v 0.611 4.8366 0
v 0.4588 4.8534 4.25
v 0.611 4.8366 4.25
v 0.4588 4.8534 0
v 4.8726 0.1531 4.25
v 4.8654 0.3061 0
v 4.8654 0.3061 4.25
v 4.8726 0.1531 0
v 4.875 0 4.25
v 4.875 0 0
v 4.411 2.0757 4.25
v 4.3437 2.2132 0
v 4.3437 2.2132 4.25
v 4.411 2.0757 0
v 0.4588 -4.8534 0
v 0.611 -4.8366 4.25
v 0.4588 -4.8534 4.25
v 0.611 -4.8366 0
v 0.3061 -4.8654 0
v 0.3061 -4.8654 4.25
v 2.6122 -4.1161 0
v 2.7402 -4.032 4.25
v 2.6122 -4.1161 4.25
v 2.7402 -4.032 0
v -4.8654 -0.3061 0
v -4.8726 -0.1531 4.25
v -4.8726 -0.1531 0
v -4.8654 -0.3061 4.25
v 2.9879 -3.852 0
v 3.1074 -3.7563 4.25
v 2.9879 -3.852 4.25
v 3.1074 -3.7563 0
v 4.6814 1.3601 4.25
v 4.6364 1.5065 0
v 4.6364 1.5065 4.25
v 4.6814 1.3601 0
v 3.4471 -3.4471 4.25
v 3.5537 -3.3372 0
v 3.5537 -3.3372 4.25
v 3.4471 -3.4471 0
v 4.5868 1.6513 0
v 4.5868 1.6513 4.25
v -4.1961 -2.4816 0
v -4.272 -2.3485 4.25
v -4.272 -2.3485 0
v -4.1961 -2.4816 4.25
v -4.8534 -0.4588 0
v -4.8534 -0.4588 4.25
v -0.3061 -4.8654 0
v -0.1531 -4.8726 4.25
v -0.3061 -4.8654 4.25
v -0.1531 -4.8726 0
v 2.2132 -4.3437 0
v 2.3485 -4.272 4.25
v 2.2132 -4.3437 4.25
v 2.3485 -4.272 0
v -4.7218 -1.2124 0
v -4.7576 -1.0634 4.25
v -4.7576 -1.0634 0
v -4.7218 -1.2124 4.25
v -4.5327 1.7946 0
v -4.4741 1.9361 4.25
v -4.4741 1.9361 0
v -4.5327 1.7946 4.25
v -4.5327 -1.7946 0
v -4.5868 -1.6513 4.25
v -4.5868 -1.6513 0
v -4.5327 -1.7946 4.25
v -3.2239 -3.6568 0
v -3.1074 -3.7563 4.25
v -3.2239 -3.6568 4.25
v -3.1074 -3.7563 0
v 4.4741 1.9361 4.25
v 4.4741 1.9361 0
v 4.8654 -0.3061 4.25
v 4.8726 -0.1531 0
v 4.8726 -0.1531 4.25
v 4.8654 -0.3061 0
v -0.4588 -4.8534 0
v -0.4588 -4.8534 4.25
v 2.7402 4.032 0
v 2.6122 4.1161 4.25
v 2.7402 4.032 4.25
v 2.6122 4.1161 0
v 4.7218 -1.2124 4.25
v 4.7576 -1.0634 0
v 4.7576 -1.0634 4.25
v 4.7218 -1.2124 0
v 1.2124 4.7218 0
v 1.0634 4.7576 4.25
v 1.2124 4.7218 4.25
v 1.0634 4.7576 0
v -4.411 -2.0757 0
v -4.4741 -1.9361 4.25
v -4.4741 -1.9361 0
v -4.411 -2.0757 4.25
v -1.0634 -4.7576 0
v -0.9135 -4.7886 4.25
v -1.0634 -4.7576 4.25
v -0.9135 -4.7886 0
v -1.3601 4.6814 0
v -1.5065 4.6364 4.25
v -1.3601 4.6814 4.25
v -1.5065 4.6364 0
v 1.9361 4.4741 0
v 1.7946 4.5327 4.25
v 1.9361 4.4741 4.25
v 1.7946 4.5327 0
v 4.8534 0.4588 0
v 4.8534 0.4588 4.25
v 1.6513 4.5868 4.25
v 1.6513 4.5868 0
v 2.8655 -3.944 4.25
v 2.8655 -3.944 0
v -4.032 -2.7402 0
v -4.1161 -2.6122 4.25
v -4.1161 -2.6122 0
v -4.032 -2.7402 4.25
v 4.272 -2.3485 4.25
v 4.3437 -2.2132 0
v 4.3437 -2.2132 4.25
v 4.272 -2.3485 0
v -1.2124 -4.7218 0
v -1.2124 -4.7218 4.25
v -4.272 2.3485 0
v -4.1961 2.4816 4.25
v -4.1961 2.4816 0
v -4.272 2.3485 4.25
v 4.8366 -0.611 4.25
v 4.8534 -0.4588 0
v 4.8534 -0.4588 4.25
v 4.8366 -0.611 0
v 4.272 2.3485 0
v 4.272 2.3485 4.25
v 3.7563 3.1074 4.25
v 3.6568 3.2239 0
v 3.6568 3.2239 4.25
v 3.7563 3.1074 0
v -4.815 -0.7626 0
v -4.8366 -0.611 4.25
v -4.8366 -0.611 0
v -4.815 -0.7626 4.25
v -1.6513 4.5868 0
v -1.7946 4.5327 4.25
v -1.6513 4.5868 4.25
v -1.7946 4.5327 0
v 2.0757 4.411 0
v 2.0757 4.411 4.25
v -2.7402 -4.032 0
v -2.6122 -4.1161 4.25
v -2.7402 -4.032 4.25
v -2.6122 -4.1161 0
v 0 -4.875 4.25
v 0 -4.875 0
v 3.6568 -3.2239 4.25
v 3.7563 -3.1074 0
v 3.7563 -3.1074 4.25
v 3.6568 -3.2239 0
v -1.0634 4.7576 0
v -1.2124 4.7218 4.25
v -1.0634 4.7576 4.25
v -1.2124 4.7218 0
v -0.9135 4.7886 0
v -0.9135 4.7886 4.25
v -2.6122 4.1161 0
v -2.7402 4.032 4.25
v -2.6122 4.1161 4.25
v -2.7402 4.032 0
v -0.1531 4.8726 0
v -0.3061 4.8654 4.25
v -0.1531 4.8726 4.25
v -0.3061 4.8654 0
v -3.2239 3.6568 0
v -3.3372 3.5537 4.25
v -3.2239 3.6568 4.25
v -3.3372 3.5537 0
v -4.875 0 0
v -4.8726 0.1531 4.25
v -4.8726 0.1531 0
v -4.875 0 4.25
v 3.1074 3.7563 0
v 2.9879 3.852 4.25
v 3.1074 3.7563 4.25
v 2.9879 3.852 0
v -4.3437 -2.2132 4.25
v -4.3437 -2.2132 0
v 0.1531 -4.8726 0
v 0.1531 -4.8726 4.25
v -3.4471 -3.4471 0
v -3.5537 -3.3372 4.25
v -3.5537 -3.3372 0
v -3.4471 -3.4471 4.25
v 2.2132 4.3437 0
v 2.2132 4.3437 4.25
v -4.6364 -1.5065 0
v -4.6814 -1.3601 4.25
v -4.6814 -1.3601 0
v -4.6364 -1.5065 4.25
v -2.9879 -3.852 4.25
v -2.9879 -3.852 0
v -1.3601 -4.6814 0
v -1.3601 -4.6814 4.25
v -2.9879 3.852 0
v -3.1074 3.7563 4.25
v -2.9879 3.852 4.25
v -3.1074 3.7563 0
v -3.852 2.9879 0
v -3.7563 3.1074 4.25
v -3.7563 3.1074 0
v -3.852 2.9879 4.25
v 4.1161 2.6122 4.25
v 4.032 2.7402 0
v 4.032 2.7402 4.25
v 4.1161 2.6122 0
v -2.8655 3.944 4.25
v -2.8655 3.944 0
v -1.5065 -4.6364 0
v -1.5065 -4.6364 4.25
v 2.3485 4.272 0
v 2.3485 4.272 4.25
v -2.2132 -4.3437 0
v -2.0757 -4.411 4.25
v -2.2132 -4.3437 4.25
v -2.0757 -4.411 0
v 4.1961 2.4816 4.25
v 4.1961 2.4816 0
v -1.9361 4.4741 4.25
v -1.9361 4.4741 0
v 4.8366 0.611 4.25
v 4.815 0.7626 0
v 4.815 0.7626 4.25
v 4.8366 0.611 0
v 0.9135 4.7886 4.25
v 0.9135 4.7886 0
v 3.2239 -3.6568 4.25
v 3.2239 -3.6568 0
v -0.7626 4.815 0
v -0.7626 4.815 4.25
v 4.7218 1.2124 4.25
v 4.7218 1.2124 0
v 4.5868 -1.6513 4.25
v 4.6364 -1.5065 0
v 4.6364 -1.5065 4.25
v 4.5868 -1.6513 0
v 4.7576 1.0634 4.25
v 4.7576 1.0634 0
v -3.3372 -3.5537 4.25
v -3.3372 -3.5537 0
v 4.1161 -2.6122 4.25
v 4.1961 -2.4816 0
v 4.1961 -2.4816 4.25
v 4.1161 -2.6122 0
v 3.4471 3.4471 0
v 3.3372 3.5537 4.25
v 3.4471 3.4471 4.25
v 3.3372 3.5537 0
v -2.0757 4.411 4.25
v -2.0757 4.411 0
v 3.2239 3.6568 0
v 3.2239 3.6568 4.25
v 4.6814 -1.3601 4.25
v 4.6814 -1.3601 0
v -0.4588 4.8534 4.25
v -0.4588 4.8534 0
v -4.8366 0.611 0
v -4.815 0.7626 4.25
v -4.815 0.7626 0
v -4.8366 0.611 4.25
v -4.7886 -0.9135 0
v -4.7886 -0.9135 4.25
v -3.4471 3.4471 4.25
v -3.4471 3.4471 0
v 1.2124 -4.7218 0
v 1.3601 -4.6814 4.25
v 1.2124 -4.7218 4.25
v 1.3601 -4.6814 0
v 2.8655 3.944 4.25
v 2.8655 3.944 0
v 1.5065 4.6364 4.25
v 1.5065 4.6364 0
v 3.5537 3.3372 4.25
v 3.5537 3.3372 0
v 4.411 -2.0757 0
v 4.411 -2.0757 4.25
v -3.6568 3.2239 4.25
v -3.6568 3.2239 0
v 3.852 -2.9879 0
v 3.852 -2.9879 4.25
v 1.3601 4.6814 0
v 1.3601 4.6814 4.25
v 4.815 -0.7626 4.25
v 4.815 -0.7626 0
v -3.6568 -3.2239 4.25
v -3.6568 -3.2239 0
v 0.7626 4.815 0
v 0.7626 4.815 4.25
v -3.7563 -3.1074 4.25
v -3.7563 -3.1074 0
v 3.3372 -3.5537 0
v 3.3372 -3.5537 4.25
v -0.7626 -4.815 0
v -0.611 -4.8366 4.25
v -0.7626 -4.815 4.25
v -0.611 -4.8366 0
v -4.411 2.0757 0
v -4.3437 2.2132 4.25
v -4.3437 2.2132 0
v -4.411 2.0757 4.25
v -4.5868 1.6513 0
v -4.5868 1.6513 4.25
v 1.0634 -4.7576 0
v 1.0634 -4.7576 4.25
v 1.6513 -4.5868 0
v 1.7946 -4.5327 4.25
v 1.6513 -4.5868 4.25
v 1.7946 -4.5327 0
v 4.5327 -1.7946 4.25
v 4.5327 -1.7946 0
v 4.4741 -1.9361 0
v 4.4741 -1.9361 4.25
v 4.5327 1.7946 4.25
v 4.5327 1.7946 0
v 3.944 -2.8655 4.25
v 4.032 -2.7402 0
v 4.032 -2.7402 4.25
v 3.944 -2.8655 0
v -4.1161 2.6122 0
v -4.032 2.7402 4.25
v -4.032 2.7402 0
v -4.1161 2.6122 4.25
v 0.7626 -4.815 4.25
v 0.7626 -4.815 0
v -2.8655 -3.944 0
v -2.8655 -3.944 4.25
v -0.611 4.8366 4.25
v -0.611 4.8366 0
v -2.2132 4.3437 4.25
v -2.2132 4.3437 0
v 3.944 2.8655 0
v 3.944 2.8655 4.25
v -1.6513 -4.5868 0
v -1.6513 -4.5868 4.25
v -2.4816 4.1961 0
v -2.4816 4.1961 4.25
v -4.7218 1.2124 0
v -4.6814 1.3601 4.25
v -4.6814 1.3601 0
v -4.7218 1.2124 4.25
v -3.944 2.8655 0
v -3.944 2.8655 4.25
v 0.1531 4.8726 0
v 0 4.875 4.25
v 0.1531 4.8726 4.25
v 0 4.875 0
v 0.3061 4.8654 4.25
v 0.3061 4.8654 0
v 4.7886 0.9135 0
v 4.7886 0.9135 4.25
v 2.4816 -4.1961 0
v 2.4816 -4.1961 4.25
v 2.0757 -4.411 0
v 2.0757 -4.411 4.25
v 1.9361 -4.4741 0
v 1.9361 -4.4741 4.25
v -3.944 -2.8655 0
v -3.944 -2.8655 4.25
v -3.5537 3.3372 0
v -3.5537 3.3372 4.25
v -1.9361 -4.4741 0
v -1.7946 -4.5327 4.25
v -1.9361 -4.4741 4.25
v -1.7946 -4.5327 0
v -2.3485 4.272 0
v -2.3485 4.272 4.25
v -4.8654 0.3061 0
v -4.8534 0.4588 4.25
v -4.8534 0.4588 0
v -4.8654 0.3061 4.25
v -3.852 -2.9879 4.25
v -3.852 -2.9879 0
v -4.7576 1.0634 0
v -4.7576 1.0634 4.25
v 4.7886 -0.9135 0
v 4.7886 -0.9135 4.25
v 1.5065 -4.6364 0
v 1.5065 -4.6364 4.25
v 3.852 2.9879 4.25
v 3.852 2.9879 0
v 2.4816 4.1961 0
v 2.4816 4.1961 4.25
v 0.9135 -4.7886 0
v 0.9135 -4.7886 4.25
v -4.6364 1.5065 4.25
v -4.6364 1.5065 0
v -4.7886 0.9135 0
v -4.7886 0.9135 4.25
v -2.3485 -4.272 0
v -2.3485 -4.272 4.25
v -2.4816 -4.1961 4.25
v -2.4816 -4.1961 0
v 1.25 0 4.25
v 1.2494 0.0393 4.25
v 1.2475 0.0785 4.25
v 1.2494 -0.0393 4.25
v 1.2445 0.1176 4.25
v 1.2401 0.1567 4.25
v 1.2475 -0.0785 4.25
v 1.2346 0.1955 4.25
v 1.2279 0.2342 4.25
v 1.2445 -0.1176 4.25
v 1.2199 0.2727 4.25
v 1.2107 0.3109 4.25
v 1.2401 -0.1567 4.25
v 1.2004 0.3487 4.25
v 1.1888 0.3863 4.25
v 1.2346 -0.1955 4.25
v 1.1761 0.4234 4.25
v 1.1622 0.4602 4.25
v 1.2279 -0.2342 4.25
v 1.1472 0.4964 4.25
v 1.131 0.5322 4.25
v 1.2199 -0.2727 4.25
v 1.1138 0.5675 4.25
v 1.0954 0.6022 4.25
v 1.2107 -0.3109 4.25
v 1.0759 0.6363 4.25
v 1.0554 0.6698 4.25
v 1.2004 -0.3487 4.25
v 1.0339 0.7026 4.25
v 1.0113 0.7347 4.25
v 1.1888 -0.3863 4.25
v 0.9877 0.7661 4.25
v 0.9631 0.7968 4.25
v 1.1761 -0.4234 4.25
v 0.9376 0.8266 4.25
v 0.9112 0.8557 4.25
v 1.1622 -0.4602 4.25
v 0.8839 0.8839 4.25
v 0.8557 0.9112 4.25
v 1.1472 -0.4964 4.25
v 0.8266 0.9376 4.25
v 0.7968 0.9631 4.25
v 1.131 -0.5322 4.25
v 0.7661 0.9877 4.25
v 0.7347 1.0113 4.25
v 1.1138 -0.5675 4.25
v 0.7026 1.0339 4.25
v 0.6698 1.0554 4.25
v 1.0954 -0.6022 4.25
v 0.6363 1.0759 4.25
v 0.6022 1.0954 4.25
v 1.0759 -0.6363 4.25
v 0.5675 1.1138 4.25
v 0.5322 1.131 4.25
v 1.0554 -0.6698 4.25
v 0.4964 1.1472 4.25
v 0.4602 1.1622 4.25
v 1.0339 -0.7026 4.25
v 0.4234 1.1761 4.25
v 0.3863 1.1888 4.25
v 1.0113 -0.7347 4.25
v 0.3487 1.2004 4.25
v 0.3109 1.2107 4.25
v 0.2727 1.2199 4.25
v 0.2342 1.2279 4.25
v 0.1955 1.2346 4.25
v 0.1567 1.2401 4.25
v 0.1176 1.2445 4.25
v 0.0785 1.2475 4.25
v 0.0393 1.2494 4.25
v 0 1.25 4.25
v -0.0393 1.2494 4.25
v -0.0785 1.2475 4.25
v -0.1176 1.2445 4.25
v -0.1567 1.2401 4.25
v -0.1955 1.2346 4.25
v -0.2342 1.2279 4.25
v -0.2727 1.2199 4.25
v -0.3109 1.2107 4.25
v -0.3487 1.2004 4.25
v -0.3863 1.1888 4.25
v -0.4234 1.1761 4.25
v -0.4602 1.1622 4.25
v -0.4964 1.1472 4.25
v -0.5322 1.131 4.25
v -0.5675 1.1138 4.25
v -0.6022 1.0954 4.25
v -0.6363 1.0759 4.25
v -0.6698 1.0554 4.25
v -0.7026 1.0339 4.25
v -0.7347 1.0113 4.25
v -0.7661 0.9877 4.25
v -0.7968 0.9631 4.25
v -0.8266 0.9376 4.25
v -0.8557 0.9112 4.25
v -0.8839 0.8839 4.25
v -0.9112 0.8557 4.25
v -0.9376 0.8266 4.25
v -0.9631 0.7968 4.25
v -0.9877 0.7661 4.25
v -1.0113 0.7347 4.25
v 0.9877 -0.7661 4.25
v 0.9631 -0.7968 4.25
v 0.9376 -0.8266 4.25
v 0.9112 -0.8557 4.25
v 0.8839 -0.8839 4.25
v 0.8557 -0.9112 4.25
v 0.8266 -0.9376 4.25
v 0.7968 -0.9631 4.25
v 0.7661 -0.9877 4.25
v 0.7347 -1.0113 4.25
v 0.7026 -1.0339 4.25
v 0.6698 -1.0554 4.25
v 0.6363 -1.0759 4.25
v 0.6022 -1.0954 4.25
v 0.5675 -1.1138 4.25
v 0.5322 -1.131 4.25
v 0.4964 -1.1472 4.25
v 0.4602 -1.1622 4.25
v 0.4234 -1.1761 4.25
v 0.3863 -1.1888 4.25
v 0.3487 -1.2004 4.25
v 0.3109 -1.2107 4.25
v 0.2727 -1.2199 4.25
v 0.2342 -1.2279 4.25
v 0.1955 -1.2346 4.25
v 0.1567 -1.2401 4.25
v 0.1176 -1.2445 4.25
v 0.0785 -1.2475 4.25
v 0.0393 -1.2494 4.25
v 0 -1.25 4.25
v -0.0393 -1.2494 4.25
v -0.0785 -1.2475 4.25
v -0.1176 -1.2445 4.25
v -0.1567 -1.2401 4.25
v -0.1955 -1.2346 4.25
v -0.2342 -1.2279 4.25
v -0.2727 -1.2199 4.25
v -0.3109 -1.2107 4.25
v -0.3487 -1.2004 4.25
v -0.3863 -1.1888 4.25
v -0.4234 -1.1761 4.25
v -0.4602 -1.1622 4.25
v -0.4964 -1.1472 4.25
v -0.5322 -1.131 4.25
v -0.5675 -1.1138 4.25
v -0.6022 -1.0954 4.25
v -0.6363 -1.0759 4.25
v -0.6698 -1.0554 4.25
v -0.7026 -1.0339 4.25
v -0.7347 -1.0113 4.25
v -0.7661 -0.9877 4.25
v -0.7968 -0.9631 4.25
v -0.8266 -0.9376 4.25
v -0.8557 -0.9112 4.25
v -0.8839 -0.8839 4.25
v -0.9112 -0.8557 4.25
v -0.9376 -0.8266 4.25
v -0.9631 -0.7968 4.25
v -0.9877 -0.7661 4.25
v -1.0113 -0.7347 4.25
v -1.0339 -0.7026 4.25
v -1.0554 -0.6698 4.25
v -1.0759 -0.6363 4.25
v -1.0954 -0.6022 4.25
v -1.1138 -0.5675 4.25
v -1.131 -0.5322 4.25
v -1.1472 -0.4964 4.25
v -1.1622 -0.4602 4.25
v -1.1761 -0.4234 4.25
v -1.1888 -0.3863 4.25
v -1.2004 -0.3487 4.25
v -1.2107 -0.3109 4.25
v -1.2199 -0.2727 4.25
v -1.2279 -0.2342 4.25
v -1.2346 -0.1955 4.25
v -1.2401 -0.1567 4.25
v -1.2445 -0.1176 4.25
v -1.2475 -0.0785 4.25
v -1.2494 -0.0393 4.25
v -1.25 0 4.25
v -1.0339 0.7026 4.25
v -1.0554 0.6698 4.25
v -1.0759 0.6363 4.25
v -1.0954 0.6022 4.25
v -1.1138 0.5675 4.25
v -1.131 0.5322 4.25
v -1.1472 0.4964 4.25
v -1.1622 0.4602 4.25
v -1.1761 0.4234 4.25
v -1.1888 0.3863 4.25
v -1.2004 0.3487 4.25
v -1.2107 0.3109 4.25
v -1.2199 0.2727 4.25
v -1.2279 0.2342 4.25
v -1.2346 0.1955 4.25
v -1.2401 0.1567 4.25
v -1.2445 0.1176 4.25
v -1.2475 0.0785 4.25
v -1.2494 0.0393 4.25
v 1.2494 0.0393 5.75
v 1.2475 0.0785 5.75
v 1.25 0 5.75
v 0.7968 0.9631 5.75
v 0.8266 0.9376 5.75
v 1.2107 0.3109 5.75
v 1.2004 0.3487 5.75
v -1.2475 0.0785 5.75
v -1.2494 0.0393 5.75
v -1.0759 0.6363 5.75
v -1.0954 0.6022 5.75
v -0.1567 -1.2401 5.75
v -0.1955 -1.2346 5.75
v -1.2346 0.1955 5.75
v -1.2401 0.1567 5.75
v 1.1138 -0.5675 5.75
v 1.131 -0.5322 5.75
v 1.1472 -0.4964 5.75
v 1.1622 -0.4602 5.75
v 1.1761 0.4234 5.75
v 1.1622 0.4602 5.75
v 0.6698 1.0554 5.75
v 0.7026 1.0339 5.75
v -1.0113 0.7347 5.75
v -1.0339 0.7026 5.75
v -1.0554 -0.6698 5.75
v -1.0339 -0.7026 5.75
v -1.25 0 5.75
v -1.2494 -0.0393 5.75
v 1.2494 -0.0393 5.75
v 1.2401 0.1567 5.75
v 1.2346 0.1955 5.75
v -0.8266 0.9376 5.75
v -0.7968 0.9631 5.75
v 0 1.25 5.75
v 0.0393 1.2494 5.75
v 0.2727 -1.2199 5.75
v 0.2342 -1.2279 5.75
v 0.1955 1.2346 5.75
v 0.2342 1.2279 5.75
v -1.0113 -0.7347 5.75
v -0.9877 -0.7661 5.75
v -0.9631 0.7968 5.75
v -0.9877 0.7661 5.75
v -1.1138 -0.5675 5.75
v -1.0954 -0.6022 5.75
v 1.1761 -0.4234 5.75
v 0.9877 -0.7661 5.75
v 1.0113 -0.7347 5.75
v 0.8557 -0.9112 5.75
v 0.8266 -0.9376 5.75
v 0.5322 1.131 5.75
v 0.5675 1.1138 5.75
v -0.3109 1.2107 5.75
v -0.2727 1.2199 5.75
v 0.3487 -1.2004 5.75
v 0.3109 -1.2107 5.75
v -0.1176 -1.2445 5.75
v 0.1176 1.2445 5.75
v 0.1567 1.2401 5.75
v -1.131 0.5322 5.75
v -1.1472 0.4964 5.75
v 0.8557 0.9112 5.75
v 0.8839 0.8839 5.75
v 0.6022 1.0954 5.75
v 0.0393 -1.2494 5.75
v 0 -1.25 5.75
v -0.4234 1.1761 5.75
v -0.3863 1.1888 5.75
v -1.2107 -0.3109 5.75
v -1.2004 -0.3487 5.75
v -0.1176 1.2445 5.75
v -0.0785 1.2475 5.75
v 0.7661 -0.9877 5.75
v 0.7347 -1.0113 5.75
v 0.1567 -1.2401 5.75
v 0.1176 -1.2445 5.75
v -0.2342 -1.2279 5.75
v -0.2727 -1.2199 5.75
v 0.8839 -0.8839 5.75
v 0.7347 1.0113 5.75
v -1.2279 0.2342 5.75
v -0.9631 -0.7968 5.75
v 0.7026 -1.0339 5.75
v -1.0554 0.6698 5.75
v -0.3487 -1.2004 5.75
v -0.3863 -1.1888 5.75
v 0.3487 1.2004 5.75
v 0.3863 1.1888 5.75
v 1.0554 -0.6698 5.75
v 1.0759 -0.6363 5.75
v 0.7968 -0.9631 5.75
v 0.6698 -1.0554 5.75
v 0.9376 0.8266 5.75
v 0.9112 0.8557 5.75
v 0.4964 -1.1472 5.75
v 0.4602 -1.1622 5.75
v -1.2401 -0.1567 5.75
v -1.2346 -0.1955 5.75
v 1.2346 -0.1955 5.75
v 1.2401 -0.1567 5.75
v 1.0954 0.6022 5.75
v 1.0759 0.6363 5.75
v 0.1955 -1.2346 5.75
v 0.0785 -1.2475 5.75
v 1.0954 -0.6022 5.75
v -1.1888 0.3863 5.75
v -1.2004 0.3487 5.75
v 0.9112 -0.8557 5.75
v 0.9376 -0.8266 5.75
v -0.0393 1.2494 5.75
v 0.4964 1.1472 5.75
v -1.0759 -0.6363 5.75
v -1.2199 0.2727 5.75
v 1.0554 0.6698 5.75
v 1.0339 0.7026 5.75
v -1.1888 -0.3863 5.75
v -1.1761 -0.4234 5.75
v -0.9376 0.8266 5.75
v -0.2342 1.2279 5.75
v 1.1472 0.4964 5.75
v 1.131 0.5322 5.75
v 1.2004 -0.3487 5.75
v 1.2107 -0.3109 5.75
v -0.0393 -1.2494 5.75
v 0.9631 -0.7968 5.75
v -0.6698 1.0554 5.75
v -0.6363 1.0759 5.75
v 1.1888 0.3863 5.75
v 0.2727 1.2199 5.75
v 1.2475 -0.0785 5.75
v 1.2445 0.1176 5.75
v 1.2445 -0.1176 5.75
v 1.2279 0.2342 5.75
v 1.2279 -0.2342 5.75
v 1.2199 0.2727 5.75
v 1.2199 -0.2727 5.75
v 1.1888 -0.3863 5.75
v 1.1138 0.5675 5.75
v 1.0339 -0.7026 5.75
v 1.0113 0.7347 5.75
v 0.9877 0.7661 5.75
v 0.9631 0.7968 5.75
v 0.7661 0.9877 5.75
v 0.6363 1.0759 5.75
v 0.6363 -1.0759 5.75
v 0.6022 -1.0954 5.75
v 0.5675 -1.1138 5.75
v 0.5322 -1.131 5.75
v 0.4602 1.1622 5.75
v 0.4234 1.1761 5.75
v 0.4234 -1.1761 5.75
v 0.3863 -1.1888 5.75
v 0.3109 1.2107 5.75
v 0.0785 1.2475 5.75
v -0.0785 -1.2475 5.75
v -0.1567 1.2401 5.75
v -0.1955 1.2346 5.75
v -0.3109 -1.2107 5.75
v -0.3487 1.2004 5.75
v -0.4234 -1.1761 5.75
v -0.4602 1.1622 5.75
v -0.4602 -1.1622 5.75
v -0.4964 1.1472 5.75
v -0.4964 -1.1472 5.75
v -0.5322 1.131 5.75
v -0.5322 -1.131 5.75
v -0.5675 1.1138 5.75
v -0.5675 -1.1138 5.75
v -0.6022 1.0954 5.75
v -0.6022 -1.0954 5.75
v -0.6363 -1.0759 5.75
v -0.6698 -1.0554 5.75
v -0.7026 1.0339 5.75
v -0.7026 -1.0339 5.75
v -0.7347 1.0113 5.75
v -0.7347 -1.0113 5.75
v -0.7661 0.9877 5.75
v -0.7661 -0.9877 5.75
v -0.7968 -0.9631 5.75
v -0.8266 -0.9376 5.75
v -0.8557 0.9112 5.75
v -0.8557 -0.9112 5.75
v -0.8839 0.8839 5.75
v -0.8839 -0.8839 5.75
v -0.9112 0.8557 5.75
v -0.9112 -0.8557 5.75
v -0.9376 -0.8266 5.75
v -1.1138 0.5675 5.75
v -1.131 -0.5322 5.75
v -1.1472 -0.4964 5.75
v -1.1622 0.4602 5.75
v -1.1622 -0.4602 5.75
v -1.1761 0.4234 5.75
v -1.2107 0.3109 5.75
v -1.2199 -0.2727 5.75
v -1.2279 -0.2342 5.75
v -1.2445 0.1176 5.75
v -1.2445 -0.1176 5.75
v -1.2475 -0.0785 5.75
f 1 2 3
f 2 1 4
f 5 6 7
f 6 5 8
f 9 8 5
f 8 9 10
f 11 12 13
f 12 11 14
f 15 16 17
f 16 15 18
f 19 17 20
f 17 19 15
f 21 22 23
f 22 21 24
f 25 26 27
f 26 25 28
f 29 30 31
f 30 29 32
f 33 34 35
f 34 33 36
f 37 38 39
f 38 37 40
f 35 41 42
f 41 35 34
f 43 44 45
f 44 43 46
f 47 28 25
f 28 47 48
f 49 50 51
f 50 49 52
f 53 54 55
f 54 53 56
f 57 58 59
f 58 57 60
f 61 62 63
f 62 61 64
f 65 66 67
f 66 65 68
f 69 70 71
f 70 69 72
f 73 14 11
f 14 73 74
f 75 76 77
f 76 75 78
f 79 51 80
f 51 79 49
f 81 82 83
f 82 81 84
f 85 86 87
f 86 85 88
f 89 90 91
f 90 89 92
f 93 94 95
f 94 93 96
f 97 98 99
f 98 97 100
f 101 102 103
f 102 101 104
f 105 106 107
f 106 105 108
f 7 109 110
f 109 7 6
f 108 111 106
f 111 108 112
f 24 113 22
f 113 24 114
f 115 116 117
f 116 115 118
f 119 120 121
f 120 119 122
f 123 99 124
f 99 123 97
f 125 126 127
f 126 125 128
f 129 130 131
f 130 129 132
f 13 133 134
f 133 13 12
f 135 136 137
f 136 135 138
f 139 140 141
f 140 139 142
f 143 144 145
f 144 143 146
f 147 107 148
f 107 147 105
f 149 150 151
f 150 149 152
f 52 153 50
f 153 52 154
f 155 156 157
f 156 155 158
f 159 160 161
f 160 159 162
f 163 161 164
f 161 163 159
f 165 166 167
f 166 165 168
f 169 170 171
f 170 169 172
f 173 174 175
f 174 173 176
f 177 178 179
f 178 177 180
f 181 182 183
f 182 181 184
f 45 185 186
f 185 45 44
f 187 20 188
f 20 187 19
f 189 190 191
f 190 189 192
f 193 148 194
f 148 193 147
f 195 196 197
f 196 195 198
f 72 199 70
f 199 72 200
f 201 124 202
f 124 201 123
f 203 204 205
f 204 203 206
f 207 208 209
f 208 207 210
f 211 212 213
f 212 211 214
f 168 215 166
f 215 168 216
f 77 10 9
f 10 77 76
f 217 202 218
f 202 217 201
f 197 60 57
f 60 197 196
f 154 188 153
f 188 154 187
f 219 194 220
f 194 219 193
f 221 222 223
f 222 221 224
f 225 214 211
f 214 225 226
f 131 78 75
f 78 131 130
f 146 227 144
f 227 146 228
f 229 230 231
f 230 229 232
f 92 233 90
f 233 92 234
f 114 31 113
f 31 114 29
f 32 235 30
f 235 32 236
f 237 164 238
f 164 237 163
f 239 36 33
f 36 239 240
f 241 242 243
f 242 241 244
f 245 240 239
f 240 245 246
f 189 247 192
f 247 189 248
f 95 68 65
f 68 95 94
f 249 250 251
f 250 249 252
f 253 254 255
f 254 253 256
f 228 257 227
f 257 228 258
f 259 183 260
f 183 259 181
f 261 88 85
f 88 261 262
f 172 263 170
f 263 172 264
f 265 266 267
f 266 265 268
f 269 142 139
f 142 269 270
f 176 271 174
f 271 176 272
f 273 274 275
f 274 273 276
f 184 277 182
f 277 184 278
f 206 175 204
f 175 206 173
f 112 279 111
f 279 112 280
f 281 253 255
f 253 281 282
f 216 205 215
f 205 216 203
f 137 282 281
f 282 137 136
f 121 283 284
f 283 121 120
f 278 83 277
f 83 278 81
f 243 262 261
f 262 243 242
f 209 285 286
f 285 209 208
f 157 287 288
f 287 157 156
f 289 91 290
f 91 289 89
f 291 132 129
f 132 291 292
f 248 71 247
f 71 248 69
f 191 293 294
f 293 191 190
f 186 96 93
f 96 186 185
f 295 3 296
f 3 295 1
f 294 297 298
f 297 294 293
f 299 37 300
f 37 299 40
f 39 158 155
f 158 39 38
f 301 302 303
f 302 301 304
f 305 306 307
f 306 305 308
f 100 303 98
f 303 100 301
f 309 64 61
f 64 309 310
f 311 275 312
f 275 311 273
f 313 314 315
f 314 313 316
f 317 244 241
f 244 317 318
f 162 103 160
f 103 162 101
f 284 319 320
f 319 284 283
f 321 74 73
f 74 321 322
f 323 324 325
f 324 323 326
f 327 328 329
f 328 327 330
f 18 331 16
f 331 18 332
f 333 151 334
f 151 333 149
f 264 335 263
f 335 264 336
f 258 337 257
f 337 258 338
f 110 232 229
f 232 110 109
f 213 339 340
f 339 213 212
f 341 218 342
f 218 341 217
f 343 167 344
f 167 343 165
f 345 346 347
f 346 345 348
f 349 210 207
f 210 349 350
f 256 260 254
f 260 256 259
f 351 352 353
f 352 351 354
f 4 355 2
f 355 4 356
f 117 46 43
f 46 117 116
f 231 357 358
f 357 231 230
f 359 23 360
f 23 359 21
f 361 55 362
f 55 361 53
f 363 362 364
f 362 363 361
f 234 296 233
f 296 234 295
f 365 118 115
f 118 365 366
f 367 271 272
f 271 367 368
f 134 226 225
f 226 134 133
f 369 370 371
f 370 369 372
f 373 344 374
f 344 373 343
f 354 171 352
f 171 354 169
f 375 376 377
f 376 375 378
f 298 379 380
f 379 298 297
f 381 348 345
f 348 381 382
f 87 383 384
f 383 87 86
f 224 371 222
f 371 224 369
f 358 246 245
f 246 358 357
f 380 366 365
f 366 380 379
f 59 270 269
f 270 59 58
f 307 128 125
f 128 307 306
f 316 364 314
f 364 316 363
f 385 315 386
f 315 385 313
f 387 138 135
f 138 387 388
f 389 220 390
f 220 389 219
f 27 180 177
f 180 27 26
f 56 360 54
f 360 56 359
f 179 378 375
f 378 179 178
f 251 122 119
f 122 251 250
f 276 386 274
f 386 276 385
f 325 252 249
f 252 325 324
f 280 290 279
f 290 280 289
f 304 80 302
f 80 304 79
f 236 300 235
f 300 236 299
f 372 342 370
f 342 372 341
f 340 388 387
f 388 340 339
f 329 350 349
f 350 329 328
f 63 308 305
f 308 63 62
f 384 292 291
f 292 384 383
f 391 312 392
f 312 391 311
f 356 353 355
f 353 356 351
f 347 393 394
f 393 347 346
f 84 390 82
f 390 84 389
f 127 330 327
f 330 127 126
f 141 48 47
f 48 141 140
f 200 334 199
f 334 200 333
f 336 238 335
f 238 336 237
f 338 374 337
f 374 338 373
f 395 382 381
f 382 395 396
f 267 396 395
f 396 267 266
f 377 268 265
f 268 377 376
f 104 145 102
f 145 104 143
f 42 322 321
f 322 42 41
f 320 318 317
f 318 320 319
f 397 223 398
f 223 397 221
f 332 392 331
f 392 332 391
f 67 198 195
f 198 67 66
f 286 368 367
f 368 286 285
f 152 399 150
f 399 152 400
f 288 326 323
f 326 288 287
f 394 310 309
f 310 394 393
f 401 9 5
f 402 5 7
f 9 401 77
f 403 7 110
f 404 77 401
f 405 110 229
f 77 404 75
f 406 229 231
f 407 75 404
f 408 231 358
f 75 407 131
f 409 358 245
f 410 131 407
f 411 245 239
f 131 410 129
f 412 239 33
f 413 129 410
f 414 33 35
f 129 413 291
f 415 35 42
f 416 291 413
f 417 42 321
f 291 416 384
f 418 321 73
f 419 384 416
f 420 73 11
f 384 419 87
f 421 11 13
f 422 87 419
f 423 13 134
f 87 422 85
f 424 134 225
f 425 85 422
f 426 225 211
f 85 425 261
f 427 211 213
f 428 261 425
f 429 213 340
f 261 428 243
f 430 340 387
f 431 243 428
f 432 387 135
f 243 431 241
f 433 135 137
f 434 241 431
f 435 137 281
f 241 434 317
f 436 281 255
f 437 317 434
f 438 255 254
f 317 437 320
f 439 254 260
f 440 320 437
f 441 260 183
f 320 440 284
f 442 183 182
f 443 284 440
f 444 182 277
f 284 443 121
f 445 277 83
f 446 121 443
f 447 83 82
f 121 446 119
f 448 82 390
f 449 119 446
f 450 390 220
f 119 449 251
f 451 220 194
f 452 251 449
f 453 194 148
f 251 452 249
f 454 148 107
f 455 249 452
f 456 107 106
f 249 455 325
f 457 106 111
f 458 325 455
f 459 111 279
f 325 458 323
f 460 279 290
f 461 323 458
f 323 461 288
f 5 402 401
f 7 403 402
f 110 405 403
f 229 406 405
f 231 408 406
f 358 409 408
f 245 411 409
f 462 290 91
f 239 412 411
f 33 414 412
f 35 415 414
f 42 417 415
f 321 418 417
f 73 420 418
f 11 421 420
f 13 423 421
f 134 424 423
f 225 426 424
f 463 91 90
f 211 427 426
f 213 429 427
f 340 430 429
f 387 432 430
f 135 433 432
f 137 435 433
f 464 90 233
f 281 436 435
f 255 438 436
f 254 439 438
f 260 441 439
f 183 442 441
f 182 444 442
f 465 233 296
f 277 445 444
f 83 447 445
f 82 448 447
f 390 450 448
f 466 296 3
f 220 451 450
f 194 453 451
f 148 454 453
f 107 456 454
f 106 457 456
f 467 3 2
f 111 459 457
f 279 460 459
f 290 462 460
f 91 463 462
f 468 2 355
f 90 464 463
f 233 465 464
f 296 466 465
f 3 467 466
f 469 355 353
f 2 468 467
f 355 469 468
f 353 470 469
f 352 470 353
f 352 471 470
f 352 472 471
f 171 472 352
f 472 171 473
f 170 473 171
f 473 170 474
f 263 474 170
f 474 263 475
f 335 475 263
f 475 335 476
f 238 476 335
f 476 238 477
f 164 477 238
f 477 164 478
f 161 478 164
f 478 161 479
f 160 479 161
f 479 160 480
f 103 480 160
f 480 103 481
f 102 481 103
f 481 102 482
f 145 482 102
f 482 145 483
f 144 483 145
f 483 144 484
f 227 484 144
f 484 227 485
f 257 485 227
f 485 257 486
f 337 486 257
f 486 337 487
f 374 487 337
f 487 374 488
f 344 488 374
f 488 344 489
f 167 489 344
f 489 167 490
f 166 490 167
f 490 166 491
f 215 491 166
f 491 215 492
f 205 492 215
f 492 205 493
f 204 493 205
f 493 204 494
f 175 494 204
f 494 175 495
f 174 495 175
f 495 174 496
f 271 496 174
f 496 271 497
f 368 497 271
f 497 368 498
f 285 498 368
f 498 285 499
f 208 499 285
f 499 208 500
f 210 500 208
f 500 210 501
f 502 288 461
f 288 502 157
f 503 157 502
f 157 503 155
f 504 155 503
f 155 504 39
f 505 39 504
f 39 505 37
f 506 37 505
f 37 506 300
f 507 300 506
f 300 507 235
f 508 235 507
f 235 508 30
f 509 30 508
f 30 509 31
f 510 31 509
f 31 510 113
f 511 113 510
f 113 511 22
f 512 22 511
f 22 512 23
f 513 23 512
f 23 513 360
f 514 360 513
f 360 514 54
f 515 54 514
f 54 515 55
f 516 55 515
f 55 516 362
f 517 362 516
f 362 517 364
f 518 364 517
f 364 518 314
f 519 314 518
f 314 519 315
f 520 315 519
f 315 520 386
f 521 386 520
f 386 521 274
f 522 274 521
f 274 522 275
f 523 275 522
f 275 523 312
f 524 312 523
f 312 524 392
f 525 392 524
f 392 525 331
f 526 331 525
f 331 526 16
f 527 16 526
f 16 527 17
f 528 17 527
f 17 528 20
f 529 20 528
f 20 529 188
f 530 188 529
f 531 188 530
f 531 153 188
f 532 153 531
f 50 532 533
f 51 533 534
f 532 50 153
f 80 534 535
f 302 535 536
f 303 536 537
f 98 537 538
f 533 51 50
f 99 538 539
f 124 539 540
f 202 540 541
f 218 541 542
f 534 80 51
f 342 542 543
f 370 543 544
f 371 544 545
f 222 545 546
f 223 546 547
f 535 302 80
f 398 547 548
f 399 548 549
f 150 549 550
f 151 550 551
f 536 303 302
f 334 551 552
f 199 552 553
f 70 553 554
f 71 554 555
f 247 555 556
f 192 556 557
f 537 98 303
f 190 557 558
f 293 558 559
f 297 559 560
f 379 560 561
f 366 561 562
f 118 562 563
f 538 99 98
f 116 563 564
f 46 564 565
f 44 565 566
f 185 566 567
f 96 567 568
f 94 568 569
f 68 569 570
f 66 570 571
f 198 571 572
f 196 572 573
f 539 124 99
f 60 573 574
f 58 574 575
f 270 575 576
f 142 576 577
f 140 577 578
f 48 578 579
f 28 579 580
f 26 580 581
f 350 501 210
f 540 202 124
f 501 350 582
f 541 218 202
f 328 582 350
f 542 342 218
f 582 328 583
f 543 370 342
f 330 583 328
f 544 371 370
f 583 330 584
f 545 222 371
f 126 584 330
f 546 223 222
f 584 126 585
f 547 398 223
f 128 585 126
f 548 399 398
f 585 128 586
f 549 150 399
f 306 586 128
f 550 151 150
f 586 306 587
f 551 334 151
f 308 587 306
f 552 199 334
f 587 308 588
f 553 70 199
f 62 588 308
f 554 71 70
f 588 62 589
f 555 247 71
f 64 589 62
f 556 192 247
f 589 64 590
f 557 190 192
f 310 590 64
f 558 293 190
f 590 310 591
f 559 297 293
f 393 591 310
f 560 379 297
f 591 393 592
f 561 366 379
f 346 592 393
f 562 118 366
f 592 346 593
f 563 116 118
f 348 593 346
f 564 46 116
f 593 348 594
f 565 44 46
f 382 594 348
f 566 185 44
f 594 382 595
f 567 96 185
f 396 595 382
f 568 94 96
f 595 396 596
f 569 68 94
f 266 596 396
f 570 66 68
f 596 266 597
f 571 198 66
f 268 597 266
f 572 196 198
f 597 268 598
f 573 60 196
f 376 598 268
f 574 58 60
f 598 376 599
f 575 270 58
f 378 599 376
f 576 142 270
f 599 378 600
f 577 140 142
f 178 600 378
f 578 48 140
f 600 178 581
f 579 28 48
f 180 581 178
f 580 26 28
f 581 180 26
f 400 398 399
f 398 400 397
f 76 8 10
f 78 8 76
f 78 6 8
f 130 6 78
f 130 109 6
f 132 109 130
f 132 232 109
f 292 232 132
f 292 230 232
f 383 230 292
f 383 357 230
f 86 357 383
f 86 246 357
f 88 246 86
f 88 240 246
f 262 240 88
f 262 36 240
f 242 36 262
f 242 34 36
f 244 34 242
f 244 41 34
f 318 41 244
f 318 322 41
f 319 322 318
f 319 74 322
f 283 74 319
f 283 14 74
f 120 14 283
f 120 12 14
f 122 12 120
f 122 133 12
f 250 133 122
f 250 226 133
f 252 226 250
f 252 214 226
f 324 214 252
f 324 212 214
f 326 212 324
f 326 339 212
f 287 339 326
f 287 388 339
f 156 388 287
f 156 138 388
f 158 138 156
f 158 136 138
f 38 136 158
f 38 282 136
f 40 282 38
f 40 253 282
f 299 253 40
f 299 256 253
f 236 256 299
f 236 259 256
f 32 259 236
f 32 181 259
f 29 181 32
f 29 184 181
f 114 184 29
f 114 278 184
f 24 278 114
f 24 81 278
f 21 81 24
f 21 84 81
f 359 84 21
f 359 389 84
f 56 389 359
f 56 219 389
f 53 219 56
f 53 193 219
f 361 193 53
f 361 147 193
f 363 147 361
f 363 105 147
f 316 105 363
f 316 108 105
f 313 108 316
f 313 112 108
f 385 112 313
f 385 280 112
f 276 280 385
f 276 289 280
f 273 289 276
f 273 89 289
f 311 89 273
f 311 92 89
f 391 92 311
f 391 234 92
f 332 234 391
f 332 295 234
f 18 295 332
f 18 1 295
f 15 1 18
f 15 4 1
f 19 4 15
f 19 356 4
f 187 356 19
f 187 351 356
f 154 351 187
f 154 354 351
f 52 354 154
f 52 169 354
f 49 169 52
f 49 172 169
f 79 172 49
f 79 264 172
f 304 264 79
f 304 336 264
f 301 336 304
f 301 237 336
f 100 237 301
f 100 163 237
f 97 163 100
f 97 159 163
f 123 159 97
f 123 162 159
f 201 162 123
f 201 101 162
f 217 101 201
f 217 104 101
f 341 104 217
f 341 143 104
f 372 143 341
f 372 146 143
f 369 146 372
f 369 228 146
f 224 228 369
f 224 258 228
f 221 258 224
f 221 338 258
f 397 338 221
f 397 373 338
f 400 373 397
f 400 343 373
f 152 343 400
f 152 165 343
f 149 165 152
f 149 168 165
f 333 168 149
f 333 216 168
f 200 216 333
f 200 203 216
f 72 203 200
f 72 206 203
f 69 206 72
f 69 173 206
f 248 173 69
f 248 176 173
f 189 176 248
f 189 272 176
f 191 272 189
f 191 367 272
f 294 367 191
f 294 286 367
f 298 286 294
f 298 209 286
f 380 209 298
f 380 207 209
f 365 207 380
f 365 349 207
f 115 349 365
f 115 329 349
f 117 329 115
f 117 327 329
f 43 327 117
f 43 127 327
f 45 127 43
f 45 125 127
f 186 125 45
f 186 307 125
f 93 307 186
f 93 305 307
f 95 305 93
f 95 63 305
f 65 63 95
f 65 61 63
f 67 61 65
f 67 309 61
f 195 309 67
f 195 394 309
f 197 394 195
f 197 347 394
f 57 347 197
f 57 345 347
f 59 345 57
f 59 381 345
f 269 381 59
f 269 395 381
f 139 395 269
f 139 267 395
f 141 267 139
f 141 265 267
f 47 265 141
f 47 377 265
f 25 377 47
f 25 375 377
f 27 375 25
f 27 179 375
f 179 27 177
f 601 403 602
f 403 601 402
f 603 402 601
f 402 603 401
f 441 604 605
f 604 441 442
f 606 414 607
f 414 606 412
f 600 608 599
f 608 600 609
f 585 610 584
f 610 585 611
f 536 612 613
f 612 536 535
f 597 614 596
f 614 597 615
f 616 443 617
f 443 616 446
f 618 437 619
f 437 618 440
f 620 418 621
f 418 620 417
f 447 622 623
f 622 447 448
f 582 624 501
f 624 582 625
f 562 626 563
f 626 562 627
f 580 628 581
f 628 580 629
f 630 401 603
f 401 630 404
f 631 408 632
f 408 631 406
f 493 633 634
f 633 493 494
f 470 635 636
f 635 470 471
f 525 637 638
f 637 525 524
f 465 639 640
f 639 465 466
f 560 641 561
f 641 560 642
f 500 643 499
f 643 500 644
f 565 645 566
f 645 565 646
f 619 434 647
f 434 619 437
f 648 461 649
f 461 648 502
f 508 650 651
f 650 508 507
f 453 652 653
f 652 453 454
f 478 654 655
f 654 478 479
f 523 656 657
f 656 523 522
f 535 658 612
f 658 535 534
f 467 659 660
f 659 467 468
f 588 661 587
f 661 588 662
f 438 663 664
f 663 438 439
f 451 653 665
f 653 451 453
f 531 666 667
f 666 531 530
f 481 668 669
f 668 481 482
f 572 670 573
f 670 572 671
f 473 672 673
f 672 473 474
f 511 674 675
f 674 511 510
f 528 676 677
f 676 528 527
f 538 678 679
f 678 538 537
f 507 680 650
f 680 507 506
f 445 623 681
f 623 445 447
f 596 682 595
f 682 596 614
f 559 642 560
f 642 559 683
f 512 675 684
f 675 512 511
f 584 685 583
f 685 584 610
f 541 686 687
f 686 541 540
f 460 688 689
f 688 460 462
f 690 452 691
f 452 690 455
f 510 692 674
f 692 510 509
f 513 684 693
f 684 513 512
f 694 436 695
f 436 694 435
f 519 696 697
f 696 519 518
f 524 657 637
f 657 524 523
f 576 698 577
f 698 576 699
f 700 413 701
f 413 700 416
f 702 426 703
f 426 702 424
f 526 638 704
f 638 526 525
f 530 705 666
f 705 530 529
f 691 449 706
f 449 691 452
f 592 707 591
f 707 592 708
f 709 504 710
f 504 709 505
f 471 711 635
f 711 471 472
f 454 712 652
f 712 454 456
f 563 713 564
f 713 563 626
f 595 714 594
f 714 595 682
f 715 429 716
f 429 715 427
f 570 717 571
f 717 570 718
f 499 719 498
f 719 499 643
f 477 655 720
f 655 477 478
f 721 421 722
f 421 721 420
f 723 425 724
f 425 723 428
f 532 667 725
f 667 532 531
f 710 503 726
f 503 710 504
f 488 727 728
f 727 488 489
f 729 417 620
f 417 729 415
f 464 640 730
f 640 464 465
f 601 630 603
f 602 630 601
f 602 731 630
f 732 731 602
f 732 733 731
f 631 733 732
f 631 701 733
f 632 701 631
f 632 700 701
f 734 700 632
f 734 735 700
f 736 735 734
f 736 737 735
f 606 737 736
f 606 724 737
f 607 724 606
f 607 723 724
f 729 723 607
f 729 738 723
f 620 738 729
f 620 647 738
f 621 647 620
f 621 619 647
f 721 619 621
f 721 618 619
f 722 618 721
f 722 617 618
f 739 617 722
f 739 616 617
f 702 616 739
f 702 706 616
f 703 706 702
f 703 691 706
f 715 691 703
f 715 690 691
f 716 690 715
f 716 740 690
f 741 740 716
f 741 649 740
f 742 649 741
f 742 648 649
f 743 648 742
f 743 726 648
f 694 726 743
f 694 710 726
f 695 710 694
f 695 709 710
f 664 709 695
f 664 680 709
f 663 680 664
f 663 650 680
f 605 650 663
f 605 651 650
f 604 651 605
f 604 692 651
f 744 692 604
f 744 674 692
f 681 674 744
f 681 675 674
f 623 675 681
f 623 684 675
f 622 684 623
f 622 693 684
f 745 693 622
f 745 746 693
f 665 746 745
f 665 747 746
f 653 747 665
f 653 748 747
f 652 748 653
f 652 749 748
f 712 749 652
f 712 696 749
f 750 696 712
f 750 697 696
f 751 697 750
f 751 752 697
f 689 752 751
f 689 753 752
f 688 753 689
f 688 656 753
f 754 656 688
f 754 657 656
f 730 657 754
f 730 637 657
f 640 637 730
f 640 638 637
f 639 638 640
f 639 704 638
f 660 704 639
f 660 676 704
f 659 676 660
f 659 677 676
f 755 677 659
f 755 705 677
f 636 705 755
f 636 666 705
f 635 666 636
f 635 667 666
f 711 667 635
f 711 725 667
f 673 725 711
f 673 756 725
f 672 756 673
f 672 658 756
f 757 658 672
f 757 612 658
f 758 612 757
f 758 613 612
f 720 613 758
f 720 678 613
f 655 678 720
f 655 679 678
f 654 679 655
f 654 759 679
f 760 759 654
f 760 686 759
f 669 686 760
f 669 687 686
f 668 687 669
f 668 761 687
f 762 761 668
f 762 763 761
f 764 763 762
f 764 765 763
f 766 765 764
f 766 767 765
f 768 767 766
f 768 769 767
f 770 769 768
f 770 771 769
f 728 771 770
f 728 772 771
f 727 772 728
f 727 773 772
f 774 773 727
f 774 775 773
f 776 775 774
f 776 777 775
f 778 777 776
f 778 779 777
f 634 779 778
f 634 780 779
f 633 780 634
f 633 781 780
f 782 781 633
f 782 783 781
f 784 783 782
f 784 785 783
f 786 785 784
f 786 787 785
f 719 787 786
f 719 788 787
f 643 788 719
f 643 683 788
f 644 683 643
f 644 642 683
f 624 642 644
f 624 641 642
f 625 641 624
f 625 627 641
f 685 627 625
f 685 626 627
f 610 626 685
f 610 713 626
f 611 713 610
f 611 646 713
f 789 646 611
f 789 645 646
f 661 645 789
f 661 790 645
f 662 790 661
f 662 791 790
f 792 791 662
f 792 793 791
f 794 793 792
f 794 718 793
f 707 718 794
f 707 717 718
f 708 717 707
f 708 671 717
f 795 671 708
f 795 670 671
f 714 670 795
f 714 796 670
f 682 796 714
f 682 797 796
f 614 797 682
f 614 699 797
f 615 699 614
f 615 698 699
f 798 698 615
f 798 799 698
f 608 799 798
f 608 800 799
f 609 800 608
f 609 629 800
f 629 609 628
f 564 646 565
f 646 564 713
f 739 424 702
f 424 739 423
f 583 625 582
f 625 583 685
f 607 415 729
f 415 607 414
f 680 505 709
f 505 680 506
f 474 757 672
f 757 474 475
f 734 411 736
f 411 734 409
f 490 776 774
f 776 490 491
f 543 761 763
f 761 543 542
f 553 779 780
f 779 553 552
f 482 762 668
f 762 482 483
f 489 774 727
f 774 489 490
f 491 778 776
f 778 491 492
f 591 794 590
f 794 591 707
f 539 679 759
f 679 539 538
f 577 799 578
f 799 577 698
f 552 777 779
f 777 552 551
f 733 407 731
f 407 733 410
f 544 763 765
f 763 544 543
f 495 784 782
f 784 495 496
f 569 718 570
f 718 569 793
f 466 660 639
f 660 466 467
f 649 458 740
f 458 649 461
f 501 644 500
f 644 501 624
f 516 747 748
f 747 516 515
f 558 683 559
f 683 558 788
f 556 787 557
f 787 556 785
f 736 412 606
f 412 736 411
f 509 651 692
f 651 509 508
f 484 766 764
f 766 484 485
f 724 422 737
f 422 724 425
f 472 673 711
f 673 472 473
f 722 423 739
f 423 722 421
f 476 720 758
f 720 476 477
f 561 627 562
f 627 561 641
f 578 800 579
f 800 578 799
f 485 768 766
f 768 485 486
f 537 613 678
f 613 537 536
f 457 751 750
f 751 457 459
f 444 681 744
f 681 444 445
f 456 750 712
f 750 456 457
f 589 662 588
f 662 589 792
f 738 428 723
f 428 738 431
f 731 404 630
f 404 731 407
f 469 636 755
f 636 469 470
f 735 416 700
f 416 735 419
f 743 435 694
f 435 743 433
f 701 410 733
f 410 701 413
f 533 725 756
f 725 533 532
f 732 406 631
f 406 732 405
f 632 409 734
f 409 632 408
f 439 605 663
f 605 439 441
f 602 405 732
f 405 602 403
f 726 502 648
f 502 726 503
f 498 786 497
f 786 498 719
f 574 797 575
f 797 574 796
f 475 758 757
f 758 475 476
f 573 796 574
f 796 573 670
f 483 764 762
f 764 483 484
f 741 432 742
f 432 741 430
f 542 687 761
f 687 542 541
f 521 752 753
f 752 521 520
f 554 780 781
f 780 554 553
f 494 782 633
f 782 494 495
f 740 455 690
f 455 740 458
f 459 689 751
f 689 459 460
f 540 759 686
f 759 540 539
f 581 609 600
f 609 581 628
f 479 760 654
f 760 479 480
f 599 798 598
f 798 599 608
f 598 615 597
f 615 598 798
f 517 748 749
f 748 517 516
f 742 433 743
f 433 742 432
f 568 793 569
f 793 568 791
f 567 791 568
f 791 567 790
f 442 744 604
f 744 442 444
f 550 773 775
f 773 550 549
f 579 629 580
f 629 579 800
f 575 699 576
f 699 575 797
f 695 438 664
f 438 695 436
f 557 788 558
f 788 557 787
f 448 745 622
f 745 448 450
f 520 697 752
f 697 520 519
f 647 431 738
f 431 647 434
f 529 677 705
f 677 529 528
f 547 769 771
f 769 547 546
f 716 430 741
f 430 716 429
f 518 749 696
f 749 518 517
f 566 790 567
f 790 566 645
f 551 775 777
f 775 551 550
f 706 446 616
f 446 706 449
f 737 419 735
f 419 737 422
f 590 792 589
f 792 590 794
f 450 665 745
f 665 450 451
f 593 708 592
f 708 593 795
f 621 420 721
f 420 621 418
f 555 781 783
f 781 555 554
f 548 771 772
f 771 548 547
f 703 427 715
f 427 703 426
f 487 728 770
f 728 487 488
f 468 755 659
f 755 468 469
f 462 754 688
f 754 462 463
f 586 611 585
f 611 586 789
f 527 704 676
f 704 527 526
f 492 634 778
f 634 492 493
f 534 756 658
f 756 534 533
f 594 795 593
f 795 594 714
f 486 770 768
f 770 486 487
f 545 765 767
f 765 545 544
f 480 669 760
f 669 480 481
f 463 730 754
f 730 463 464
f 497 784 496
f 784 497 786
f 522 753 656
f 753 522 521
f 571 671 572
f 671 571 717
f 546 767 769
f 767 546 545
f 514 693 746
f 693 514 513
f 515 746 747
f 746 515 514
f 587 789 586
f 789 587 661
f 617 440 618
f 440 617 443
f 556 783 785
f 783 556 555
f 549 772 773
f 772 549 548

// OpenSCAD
{ // Dimensions
  diameter1 = 9.75;
  diameter2 = 2.5;
  depth1 = 4.25;
  depth2 = 5.75 - depth1;

  $fn = 200;
}

cylinder(d=diameter1, h=depth1);
translate([0, 0, depth1]) {
  cylinder(d=diameter2, h=depth2);
}
